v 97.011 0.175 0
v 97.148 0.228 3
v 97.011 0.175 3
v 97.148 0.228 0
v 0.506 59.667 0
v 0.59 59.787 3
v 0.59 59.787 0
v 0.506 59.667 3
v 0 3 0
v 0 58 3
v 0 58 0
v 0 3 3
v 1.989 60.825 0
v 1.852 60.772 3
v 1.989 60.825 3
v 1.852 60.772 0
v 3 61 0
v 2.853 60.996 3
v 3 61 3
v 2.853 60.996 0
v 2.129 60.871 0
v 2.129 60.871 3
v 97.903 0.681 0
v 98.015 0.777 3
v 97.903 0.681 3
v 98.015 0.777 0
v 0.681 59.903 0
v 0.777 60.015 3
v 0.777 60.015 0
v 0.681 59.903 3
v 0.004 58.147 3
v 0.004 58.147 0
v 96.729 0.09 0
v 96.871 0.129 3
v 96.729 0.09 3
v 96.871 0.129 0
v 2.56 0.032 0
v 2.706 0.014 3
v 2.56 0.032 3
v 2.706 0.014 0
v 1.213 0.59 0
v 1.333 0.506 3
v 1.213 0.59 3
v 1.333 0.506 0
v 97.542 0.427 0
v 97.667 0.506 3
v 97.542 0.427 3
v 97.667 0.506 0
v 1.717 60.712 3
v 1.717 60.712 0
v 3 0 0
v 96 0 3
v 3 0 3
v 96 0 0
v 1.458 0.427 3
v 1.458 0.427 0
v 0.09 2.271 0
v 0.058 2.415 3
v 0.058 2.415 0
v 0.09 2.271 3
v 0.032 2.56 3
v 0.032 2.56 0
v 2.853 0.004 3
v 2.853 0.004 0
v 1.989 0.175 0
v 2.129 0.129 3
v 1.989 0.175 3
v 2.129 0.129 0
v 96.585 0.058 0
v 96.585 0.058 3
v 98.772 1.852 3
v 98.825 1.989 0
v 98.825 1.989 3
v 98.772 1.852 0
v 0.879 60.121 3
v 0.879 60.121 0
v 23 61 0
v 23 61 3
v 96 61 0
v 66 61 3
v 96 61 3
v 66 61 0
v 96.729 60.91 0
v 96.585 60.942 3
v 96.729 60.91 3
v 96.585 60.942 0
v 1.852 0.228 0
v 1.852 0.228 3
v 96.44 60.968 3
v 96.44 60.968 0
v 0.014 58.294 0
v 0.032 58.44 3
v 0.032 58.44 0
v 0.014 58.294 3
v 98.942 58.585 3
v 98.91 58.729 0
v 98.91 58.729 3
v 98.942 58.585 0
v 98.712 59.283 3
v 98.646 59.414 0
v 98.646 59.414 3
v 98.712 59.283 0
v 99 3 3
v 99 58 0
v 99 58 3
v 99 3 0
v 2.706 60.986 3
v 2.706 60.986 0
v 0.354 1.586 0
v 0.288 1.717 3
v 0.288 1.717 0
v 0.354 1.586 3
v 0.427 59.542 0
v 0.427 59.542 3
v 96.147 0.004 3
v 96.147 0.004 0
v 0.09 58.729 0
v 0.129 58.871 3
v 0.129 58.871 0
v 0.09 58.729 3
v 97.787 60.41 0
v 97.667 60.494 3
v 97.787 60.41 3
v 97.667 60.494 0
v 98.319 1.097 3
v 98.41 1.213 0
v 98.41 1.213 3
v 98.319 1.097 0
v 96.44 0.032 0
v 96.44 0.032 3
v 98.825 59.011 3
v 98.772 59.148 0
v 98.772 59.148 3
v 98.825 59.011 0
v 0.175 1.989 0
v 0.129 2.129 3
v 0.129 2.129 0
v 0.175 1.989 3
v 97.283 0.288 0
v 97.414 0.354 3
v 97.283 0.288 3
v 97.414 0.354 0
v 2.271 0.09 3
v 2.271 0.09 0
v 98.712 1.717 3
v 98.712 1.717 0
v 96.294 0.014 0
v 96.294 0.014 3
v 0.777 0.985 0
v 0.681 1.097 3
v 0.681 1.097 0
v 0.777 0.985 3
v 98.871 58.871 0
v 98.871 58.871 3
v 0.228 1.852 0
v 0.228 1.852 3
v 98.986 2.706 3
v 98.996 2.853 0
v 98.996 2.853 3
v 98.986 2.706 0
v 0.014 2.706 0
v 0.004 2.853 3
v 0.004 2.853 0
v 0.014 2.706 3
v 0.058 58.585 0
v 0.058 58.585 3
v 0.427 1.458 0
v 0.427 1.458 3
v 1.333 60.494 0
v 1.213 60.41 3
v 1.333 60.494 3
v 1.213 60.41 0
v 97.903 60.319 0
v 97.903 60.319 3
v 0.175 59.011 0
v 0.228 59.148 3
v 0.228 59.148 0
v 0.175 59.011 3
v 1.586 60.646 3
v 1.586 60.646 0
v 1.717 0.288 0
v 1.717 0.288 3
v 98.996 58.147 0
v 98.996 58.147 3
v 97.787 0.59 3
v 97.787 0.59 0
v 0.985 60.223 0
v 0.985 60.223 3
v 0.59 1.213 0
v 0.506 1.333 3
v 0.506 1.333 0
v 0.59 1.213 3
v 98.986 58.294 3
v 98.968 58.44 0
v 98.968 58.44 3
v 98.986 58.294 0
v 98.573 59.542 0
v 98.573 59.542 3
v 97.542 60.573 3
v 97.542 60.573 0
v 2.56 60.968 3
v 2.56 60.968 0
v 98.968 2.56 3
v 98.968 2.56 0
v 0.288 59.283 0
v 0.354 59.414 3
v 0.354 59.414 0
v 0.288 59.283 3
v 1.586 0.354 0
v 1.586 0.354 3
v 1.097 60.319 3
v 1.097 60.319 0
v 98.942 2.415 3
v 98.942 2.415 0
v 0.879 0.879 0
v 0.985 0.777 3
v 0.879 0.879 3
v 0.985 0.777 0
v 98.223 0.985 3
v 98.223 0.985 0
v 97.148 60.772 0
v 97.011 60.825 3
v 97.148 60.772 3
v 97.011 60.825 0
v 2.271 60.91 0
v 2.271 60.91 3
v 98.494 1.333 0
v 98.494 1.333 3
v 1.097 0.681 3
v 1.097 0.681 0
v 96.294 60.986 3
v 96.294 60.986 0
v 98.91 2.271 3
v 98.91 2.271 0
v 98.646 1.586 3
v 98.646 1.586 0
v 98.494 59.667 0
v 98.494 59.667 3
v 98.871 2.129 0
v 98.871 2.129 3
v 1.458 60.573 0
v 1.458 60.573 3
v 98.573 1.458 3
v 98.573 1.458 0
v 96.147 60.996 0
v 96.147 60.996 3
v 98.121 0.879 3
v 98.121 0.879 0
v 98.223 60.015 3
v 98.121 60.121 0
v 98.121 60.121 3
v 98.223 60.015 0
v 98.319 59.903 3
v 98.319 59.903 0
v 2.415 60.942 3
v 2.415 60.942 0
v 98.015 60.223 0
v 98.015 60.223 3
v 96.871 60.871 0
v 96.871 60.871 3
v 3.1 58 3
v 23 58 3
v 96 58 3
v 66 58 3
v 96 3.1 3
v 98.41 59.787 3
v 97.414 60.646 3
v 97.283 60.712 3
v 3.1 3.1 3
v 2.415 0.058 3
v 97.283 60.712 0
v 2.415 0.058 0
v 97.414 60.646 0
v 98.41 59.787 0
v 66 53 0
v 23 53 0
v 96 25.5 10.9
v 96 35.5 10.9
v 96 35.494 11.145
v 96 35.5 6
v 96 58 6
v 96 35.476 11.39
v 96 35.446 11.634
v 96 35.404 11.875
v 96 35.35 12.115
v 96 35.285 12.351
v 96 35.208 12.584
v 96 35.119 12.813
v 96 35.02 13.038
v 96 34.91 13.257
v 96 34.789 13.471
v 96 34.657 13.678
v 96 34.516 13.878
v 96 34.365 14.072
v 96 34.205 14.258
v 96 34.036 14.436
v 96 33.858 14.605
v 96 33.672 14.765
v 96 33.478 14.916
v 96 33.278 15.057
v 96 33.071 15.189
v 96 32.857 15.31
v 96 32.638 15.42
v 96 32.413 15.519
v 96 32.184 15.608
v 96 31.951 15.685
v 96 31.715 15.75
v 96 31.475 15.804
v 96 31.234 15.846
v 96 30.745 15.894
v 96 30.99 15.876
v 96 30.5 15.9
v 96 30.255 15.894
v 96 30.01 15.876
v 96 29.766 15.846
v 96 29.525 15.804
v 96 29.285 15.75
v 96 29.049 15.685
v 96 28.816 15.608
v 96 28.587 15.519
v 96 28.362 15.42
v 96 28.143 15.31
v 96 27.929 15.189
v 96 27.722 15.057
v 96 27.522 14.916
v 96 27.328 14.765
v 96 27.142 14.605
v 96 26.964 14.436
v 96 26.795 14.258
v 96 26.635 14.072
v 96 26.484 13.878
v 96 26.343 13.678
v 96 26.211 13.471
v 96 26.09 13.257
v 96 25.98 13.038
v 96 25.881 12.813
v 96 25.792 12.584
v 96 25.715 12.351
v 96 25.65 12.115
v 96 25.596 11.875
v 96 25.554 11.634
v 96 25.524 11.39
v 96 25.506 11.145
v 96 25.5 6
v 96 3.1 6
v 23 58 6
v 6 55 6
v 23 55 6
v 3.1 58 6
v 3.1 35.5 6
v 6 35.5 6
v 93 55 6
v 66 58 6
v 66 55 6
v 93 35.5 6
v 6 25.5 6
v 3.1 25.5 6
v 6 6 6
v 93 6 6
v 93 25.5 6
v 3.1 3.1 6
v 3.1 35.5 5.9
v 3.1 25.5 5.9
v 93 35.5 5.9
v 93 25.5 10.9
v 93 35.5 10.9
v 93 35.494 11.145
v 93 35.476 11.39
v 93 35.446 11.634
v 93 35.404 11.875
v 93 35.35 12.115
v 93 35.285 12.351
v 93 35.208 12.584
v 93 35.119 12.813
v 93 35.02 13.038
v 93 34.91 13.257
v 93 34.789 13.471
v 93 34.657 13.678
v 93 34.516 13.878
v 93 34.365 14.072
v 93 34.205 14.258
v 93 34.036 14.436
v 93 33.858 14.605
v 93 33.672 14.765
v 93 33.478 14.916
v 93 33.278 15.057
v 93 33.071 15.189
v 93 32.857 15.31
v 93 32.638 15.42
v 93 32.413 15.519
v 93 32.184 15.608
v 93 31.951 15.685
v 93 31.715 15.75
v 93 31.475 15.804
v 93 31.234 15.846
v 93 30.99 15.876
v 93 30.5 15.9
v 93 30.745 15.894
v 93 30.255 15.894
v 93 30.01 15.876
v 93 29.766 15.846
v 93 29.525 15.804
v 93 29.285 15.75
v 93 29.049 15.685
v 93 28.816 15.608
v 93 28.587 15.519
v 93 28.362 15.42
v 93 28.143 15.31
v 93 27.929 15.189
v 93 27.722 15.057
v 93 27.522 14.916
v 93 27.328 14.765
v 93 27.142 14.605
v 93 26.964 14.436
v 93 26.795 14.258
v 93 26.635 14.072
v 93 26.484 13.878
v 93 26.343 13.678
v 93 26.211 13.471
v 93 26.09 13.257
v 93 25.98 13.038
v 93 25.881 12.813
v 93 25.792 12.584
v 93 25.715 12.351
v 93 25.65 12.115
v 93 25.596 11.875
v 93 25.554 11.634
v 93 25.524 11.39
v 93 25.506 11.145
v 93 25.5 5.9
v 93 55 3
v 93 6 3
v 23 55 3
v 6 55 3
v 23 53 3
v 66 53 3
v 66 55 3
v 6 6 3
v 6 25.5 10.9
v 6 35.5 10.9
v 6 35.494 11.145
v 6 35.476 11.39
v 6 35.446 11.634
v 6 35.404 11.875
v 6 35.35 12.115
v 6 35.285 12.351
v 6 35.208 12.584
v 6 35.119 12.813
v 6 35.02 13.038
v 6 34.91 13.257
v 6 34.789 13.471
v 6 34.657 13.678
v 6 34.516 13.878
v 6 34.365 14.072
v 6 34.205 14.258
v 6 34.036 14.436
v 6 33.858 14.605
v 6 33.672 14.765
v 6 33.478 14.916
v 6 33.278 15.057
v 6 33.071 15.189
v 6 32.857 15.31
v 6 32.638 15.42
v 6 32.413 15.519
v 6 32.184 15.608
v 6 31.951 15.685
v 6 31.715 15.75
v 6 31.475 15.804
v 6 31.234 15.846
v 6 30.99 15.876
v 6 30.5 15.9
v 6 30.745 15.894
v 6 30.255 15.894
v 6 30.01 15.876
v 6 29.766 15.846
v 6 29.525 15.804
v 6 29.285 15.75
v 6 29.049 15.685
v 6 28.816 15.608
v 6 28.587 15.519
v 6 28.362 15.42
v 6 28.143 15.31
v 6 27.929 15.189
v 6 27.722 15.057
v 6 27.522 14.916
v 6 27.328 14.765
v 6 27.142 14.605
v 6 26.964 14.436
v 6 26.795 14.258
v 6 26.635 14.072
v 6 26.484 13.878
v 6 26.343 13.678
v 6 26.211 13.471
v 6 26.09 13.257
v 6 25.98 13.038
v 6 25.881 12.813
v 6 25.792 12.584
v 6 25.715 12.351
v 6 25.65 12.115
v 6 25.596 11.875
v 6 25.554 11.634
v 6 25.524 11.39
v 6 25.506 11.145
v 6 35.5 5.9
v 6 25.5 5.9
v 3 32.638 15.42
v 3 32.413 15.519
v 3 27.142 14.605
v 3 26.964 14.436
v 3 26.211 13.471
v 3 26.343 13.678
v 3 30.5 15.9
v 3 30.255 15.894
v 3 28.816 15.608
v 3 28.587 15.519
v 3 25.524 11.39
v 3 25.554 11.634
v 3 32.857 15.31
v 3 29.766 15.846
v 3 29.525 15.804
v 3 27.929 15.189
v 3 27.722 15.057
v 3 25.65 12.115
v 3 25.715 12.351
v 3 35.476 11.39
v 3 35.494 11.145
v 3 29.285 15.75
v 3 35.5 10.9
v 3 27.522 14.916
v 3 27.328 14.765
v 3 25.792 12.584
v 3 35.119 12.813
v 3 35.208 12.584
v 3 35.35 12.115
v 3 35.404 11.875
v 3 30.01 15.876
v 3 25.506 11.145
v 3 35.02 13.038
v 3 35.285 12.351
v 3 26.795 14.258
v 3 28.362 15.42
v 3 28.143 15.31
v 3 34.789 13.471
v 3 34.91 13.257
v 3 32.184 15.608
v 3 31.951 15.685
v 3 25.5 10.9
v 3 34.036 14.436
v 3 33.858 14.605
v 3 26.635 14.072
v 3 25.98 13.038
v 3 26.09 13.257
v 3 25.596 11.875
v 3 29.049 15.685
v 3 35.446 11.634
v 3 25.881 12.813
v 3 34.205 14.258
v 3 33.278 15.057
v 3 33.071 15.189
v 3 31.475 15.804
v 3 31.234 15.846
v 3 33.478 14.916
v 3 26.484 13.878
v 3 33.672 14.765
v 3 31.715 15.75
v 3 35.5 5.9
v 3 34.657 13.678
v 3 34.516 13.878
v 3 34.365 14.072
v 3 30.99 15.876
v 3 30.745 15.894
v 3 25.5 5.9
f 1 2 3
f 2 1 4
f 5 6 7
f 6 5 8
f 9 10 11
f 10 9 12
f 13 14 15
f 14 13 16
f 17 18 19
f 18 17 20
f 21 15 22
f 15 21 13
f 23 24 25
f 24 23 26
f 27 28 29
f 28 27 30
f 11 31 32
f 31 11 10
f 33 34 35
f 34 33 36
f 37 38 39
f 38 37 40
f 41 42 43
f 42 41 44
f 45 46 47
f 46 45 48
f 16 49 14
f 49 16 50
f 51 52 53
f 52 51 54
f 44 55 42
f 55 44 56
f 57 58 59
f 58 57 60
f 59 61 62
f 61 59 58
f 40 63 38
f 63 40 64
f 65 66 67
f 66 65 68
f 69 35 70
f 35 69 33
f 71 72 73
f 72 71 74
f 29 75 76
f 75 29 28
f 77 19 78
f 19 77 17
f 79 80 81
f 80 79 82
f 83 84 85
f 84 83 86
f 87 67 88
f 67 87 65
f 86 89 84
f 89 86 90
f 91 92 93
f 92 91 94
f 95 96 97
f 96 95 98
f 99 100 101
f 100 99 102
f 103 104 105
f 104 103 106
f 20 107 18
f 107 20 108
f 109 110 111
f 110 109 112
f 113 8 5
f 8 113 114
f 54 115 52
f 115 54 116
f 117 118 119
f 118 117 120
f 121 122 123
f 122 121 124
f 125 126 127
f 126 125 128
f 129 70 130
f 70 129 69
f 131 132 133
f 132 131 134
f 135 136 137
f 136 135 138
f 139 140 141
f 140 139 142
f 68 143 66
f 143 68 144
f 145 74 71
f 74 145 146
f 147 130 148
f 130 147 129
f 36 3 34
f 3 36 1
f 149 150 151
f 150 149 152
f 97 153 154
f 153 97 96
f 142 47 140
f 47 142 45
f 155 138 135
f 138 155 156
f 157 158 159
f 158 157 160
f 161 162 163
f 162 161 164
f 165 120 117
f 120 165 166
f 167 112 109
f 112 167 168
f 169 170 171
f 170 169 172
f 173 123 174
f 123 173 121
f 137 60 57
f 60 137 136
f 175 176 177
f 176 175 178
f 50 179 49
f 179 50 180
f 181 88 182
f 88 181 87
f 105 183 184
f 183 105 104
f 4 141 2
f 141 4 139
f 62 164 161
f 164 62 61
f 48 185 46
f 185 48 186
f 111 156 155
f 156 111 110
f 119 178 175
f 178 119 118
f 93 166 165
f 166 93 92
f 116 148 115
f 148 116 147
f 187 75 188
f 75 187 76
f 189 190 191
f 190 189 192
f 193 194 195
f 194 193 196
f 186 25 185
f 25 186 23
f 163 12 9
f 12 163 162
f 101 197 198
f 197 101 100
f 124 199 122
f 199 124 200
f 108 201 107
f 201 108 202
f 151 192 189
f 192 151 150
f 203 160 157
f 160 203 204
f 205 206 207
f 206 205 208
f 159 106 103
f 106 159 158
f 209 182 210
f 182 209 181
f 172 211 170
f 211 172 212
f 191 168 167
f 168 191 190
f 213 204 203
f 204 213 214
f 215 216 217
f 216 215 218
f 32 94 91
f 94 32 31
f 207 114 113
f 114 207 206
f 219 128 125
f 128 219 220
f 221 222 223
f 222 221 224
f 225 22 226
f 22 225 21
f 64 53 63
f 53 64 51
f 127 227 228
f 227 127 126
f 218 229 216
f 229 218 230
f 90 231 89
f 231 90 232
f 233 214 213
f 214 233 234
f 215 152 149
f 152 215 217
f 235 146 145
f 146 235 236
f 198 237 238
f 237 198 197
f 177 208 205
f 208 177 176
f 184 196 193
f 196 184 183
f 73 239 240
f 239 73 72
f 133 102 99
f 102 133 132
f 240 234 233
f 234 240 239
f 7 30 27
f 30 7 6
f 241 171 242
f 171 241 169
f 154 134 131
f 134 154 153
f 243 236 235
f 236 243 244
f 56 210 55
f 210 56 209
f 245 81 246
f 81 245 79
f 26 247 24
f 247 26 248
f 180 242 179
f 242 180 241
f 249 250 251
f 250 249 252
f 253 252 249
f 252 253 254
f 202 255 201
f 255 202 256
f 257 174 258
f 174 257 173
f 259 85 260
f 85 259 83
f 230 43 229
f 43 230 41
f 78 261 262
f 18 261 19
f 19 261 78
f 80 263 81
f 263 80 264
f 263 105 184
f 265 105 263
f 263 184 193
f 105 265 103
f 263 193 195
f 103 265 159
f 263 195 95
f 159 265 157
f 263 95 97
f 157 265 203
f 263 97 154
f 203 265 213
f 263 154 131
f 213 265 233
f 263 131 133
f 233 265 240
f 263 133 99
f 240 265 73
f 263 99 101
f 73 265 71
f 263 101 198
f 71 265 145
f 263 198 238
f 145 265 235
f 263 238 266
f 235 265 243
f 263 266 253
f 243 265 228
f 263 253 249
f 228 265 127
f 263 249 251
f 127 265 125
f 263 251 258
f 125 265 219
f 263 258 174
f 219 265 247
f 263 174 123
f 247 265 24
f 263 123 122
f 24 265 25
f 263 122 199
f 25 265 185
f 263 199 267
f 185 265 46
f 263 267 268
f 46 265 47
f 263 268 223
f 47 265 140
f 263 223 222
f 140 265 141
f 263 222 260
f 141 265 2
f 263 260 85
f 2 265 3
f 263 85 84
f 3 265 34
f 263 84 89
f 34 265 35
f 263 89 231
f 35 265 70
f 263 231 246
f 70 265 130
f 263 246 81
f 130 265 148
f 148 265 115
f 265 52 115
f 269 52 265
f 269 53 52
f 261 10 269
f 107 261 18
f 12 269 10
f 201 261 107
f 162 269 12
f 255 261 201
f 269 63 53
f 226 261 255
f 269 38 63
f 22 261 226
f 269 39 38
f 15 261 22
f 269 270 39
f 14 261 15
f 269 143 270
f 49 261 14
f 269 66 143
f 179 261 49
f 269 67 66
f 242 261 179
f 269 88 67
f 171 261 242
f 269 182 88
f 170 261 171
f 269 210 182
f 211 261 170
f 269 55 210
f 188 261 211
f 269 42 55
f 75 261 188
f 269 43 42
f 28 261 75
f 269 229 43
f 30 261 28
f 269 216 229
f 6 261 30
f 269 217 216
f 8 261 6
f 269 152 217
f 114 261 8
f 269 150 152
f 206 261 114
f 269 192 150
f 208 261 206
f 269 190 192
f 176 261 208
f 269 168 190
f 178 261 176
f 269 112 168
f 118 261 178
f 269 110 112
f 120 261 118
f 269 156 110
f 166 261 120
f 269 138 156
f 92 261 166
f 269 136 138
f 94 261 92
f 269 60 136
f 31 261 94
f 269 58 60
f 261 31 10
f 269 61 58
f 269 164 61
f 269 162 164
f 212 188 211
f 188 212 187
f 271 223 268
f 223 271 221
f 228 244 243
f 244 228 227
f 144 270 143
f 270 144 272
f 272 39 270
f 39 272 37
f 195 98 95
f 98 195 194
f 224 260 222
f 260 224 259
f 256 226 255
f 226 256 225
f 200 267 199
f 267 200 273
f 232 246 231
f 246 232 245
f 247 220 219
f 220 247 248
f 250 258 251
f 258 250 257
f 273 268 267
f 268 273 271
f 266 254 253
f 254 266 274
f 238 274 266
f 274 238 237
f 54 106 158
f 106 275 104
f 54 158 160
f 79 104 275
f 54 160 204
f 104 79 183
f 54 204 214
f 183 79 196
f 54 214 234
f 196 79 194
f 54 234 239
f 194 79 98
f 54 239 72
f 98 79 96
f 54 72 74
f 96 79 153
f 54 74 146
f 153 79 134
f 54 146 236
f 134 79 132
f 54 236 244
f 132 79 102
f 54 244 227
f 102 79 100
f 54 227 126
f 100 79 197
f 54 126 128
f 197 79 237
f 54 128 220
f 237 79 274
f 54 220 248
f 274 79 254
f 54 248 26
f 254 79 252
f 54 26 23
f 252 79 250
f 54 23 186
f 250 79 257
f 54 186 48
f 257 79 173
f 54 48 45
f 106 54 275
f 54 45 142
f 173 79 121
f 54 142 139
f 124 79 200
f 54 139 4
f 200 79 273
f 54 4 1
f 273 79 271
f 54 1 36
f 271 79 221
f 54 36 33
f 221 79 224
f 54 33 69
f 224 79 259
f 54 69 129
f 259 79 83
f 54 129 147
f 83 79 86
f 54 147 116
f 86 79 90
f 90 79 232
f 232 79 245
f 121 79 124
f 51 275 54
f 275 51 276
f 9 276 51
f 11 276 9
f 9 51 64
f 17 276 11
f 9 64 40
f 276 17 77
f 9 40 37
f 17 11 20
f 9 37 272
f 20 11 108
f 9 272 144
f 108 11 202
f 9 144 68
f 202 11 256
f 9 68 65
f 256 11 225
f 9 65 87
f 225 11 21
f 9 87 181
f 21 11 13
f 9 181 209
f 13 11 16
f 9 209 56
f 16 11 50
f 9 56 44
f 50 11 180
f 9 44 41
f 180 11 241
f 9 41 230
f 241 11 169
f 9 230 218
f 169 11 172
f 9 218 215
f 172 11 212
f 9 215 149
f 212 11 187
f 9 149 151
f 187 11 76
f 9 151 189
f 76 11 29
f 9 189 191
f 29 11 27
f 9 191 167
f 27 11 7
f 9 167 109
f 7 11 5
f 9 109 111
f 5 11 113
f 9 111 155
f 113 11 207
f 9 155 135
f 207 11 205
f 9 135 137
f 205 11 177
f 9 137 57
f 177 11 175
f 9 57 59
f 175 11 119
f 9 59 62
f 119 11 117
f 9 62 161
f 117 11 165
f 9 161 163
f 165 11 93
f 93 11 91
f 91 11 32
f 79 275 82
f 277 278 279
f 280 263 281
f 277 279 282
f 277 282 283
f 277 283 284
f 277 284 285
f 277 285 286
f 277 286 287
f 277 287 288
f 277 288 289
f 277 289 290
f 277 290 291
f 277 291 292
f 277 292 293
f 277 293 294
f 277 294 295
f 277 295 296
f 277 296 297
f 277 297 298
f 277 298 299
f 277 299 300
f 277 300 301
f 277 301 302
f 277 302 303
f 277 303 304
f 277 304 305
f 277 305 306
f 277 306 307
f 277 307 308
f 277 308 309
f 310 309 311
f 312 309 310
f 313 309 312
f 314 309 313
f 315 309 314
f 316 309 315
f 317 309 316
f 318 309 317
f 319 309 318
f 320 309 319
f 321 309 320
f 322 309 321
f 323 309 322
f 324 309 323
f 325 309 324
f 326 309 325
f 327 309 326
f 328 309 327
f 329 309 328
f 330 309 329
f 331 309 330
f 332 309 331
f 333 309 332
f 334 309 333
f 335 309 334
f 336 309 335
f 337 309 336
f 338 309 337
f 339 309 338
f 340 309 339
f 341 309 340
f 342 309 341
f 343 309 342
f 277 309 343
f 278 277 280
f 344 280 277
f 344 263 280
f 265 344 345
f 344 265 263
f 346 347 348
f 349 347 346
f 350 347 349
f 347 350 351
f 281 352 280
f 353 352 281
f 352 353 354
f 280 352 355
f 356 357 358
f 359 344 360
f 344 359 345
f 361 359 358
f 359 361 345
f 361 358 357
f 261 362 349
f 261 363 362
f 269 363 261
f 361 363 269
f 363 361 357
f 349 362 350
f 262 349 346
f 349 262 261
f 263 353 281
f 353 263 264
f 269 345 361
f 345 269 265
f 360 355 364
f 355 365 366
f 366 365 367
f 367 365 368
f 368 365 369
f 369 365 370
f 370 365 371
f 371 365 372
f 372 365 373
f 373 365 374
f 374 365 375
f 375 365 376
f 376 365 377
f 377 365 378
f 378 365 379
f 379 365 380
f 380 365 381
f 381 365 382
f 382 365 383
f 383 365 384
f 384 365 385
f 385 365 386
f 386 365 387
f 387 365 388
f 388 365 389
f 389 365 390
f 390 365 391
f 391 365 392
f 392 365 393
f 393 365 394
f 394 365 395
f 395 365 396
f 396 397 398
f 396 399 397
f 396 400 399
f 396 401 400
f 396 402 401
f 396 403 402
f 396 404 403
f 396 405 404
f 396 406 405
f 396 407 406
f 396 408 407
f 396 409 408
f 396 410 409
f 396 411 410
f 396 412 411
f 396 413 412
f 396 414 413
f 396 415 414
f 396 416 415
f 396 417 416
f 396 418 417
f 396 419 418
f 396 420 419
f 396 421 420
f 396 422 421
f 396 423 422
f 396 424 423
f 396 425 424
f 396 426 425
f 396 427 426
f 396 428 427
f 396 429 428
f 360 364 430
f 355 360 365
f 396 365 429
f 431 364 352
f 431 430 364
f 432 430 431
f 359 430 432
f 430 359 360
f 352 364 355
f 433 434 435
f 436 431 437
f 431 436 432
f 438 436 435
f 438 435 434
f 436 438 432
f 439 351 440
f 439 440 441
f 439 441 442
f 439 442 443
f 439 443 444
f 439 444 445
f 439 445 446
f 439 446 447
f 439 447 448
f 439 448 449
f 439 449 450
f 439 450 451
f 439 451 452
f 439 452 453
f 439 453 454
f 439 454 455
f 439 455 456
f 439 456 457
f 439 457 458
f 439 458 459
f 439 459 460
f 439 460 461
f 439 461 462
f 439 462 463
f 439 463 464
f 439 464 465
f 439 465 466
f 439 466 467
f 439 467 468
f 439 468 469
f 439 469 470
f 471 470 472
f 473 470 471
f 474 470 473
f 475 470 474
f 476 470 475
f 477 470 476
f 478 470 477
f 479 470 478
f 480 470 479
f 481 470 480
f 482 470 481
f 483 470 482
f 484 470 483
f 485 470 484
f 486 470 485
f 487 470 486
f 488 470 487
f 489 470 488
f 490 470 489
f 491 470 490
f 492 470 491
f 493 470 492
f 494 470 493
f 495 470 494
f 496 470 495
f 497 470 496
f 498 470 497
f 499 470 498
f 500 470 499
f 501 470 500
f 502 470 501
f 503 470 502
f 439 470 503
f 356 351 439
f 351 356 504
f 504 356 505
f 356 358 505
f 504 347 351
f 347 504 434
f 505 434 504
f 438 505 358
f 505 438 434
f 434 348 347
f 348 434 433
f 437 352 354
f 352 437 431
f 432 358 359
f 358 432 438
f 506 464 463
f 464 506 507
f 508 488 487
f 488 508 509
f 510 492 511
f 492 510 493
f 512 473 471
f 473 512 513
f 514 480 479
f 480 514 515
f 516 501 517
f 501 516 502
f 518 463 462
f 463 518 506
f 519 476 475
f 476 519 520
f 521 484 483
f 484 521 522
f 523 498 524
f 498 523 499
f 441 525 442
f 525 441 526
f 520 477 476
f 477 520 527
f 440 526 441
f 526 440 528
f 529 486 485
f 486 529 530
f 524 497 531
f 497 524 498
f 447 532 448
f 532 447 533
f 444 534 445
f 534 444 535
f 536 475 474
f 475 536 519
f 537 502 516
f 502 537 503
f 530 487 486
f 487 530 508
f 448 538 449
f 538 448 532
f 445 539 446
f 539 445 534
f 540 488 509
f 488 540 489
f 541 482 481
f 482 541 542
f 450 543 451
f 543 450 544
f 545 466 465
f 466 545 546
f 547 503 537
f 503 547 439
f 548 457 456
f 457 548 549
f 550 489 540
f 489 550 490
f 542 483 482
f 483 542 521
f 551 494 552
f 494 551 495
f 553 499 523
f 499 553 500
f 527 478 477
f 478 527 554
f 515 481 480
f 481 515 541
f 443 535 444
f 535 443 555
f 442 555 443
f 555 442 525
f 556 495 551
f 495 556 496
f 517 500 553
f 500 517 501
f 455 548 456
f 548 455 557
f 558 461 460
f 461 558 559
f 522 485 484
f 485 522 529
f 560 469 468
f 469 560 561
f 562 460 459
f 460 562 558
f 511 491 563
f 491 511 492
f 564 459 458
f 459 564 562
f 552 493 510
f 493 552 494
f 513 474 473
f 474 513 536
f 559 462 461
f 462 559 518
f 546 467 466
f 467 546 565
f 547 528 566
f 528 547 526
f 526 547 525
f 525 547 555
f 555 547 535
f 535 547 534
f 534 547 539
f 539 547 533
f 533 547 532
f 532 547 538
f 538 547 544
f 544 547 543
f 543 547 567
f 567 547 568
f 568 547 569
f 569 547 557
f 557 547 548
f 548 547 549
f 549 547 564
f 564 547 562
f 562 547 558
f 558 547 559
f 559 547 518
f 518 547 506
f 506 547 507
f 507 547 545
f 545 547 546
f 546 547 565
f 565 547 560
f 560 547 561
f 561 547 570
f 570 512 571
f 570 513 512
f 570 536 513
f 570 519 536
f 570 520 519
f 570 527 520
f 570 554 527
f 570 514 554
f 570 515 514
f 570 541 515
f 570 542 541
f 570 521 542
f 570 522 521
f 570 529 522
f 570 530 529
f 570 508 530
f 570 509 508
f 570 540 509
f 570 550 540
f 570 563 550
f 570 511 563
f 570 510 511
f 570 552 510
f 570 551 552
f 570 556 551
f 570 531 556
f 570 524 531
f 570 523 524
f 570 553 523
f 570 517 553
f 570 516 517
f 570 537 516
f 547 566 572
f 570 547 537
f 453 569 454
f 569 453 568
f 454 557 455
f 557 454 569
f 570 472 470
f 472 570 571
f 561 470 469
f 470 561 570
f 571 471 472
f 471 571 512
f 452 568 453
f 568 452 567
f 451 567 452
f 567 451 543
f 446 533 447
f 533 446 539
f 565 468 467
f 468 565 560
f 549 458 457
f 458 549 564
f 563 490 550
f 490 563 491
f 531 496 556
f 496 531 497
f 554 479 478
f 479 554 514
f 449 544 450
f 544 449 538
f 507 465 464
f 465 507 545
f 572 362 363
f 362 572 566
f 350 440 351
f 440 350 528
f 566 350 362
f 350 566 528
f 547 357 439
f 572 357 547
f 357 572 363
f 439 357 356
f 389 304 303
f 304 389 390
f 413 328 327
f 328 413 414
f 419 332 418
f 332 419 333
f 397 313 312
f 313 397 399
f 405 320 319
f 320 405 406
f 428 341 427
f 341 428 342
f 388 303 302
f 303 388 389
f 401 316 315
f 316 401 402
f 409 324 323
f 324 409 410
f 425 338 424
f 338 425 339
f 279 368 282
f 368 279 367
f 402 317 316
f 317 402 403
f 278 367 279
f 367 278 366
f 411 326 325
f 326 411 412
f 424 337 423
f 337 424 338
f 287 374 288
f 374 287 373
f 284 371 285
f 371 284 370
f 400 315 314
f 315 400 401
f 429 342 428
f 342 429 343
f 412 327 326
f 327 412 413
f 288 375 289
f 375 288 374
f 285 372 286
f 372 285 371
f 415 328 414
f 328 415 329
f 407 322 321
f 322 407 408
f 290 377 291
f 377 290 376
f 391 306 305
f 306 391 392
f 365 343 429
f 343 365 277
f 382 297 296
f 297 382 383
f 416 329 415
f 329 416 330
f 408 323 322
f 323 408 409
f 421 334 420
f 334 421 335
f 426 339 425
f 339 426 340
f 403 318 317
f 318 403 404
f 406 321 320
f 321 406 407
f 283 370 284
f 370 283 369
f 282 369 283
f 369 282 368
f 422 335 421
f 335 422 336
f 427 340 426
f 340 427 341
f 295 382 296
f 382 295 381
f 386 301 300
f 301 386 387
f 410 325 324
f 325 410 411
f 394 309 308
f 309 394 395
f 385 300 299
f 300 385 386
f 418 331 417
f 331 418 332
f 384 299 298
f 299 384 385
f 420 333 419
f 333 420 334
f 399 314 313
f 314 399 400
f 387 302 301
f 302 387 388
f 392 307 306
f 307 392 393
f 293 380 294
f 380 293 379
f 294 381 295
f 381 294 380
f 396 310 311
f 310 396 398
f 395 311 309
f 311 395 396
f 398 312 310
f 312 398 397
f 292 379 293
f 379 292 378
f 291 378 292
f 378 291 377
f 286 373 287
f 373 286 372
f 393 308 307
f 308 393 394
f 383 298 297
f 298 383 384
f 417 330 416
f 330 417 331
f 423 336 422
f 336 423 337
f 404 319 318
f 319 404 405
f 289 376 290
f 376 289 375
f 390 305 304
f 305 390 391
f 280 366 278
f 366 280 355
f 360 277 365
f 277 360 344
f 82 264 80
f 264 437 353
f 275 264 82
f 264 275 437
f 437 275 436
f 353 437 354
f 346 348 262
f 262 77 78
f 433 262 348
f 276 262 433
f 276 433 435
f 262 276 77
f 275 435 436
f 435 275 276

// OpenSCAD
tls=3;

b1=47;
a1=83;
a=93;
b=55;
c=32;

a2=tls+(a-a1)/2;
b2=tls+b/2;

a3=tls+a-(a-a1)/2;
b3_1=tls+(b-b1)/2;
b3_2=tls+b-(b-b1)/2;

$fn=128;

module box() {
//коробка
    difference() {
        union() {
            minkowski()
            {
                translate([tls,tls,0]) cube([a,b,tls/2]);
                cylinder(r=tls,h=tls/2);
            }
            translate([tls+0.1,tls+0.1,tls]) cube([a-0.1,b-0.1,tls]);
        }
        translate([tls*2,tls*2,tls]) cube([a-tls*2,b-tls*2,tls]);
    }
}

module ear() {
//крепежные уши
    d1=10;
    translate([0,-d1/2,d1/2]) rotate ([0,90,0]) {
        difference() {

            union() {
                translate([0,d1/2,0]) cylinder(d=d1,h=tls);
                translate([0,0,0]) cube([d1/2,d1,tls]);
            }
            //translate([0,d1/2,0]) cylinder(d=3,h=tls);
        }
    }
}

difference() {
    union() {
        box(); //коробка

        //крепежные уши
        translate([tls,b/2+tls,2*tls-0.1]) ear();
        translate([a,b/2+tls,2*tls-0.1]) ear();
        
    }
    translate([a3-25-43,53,0]) cube(43,30,42);
}
